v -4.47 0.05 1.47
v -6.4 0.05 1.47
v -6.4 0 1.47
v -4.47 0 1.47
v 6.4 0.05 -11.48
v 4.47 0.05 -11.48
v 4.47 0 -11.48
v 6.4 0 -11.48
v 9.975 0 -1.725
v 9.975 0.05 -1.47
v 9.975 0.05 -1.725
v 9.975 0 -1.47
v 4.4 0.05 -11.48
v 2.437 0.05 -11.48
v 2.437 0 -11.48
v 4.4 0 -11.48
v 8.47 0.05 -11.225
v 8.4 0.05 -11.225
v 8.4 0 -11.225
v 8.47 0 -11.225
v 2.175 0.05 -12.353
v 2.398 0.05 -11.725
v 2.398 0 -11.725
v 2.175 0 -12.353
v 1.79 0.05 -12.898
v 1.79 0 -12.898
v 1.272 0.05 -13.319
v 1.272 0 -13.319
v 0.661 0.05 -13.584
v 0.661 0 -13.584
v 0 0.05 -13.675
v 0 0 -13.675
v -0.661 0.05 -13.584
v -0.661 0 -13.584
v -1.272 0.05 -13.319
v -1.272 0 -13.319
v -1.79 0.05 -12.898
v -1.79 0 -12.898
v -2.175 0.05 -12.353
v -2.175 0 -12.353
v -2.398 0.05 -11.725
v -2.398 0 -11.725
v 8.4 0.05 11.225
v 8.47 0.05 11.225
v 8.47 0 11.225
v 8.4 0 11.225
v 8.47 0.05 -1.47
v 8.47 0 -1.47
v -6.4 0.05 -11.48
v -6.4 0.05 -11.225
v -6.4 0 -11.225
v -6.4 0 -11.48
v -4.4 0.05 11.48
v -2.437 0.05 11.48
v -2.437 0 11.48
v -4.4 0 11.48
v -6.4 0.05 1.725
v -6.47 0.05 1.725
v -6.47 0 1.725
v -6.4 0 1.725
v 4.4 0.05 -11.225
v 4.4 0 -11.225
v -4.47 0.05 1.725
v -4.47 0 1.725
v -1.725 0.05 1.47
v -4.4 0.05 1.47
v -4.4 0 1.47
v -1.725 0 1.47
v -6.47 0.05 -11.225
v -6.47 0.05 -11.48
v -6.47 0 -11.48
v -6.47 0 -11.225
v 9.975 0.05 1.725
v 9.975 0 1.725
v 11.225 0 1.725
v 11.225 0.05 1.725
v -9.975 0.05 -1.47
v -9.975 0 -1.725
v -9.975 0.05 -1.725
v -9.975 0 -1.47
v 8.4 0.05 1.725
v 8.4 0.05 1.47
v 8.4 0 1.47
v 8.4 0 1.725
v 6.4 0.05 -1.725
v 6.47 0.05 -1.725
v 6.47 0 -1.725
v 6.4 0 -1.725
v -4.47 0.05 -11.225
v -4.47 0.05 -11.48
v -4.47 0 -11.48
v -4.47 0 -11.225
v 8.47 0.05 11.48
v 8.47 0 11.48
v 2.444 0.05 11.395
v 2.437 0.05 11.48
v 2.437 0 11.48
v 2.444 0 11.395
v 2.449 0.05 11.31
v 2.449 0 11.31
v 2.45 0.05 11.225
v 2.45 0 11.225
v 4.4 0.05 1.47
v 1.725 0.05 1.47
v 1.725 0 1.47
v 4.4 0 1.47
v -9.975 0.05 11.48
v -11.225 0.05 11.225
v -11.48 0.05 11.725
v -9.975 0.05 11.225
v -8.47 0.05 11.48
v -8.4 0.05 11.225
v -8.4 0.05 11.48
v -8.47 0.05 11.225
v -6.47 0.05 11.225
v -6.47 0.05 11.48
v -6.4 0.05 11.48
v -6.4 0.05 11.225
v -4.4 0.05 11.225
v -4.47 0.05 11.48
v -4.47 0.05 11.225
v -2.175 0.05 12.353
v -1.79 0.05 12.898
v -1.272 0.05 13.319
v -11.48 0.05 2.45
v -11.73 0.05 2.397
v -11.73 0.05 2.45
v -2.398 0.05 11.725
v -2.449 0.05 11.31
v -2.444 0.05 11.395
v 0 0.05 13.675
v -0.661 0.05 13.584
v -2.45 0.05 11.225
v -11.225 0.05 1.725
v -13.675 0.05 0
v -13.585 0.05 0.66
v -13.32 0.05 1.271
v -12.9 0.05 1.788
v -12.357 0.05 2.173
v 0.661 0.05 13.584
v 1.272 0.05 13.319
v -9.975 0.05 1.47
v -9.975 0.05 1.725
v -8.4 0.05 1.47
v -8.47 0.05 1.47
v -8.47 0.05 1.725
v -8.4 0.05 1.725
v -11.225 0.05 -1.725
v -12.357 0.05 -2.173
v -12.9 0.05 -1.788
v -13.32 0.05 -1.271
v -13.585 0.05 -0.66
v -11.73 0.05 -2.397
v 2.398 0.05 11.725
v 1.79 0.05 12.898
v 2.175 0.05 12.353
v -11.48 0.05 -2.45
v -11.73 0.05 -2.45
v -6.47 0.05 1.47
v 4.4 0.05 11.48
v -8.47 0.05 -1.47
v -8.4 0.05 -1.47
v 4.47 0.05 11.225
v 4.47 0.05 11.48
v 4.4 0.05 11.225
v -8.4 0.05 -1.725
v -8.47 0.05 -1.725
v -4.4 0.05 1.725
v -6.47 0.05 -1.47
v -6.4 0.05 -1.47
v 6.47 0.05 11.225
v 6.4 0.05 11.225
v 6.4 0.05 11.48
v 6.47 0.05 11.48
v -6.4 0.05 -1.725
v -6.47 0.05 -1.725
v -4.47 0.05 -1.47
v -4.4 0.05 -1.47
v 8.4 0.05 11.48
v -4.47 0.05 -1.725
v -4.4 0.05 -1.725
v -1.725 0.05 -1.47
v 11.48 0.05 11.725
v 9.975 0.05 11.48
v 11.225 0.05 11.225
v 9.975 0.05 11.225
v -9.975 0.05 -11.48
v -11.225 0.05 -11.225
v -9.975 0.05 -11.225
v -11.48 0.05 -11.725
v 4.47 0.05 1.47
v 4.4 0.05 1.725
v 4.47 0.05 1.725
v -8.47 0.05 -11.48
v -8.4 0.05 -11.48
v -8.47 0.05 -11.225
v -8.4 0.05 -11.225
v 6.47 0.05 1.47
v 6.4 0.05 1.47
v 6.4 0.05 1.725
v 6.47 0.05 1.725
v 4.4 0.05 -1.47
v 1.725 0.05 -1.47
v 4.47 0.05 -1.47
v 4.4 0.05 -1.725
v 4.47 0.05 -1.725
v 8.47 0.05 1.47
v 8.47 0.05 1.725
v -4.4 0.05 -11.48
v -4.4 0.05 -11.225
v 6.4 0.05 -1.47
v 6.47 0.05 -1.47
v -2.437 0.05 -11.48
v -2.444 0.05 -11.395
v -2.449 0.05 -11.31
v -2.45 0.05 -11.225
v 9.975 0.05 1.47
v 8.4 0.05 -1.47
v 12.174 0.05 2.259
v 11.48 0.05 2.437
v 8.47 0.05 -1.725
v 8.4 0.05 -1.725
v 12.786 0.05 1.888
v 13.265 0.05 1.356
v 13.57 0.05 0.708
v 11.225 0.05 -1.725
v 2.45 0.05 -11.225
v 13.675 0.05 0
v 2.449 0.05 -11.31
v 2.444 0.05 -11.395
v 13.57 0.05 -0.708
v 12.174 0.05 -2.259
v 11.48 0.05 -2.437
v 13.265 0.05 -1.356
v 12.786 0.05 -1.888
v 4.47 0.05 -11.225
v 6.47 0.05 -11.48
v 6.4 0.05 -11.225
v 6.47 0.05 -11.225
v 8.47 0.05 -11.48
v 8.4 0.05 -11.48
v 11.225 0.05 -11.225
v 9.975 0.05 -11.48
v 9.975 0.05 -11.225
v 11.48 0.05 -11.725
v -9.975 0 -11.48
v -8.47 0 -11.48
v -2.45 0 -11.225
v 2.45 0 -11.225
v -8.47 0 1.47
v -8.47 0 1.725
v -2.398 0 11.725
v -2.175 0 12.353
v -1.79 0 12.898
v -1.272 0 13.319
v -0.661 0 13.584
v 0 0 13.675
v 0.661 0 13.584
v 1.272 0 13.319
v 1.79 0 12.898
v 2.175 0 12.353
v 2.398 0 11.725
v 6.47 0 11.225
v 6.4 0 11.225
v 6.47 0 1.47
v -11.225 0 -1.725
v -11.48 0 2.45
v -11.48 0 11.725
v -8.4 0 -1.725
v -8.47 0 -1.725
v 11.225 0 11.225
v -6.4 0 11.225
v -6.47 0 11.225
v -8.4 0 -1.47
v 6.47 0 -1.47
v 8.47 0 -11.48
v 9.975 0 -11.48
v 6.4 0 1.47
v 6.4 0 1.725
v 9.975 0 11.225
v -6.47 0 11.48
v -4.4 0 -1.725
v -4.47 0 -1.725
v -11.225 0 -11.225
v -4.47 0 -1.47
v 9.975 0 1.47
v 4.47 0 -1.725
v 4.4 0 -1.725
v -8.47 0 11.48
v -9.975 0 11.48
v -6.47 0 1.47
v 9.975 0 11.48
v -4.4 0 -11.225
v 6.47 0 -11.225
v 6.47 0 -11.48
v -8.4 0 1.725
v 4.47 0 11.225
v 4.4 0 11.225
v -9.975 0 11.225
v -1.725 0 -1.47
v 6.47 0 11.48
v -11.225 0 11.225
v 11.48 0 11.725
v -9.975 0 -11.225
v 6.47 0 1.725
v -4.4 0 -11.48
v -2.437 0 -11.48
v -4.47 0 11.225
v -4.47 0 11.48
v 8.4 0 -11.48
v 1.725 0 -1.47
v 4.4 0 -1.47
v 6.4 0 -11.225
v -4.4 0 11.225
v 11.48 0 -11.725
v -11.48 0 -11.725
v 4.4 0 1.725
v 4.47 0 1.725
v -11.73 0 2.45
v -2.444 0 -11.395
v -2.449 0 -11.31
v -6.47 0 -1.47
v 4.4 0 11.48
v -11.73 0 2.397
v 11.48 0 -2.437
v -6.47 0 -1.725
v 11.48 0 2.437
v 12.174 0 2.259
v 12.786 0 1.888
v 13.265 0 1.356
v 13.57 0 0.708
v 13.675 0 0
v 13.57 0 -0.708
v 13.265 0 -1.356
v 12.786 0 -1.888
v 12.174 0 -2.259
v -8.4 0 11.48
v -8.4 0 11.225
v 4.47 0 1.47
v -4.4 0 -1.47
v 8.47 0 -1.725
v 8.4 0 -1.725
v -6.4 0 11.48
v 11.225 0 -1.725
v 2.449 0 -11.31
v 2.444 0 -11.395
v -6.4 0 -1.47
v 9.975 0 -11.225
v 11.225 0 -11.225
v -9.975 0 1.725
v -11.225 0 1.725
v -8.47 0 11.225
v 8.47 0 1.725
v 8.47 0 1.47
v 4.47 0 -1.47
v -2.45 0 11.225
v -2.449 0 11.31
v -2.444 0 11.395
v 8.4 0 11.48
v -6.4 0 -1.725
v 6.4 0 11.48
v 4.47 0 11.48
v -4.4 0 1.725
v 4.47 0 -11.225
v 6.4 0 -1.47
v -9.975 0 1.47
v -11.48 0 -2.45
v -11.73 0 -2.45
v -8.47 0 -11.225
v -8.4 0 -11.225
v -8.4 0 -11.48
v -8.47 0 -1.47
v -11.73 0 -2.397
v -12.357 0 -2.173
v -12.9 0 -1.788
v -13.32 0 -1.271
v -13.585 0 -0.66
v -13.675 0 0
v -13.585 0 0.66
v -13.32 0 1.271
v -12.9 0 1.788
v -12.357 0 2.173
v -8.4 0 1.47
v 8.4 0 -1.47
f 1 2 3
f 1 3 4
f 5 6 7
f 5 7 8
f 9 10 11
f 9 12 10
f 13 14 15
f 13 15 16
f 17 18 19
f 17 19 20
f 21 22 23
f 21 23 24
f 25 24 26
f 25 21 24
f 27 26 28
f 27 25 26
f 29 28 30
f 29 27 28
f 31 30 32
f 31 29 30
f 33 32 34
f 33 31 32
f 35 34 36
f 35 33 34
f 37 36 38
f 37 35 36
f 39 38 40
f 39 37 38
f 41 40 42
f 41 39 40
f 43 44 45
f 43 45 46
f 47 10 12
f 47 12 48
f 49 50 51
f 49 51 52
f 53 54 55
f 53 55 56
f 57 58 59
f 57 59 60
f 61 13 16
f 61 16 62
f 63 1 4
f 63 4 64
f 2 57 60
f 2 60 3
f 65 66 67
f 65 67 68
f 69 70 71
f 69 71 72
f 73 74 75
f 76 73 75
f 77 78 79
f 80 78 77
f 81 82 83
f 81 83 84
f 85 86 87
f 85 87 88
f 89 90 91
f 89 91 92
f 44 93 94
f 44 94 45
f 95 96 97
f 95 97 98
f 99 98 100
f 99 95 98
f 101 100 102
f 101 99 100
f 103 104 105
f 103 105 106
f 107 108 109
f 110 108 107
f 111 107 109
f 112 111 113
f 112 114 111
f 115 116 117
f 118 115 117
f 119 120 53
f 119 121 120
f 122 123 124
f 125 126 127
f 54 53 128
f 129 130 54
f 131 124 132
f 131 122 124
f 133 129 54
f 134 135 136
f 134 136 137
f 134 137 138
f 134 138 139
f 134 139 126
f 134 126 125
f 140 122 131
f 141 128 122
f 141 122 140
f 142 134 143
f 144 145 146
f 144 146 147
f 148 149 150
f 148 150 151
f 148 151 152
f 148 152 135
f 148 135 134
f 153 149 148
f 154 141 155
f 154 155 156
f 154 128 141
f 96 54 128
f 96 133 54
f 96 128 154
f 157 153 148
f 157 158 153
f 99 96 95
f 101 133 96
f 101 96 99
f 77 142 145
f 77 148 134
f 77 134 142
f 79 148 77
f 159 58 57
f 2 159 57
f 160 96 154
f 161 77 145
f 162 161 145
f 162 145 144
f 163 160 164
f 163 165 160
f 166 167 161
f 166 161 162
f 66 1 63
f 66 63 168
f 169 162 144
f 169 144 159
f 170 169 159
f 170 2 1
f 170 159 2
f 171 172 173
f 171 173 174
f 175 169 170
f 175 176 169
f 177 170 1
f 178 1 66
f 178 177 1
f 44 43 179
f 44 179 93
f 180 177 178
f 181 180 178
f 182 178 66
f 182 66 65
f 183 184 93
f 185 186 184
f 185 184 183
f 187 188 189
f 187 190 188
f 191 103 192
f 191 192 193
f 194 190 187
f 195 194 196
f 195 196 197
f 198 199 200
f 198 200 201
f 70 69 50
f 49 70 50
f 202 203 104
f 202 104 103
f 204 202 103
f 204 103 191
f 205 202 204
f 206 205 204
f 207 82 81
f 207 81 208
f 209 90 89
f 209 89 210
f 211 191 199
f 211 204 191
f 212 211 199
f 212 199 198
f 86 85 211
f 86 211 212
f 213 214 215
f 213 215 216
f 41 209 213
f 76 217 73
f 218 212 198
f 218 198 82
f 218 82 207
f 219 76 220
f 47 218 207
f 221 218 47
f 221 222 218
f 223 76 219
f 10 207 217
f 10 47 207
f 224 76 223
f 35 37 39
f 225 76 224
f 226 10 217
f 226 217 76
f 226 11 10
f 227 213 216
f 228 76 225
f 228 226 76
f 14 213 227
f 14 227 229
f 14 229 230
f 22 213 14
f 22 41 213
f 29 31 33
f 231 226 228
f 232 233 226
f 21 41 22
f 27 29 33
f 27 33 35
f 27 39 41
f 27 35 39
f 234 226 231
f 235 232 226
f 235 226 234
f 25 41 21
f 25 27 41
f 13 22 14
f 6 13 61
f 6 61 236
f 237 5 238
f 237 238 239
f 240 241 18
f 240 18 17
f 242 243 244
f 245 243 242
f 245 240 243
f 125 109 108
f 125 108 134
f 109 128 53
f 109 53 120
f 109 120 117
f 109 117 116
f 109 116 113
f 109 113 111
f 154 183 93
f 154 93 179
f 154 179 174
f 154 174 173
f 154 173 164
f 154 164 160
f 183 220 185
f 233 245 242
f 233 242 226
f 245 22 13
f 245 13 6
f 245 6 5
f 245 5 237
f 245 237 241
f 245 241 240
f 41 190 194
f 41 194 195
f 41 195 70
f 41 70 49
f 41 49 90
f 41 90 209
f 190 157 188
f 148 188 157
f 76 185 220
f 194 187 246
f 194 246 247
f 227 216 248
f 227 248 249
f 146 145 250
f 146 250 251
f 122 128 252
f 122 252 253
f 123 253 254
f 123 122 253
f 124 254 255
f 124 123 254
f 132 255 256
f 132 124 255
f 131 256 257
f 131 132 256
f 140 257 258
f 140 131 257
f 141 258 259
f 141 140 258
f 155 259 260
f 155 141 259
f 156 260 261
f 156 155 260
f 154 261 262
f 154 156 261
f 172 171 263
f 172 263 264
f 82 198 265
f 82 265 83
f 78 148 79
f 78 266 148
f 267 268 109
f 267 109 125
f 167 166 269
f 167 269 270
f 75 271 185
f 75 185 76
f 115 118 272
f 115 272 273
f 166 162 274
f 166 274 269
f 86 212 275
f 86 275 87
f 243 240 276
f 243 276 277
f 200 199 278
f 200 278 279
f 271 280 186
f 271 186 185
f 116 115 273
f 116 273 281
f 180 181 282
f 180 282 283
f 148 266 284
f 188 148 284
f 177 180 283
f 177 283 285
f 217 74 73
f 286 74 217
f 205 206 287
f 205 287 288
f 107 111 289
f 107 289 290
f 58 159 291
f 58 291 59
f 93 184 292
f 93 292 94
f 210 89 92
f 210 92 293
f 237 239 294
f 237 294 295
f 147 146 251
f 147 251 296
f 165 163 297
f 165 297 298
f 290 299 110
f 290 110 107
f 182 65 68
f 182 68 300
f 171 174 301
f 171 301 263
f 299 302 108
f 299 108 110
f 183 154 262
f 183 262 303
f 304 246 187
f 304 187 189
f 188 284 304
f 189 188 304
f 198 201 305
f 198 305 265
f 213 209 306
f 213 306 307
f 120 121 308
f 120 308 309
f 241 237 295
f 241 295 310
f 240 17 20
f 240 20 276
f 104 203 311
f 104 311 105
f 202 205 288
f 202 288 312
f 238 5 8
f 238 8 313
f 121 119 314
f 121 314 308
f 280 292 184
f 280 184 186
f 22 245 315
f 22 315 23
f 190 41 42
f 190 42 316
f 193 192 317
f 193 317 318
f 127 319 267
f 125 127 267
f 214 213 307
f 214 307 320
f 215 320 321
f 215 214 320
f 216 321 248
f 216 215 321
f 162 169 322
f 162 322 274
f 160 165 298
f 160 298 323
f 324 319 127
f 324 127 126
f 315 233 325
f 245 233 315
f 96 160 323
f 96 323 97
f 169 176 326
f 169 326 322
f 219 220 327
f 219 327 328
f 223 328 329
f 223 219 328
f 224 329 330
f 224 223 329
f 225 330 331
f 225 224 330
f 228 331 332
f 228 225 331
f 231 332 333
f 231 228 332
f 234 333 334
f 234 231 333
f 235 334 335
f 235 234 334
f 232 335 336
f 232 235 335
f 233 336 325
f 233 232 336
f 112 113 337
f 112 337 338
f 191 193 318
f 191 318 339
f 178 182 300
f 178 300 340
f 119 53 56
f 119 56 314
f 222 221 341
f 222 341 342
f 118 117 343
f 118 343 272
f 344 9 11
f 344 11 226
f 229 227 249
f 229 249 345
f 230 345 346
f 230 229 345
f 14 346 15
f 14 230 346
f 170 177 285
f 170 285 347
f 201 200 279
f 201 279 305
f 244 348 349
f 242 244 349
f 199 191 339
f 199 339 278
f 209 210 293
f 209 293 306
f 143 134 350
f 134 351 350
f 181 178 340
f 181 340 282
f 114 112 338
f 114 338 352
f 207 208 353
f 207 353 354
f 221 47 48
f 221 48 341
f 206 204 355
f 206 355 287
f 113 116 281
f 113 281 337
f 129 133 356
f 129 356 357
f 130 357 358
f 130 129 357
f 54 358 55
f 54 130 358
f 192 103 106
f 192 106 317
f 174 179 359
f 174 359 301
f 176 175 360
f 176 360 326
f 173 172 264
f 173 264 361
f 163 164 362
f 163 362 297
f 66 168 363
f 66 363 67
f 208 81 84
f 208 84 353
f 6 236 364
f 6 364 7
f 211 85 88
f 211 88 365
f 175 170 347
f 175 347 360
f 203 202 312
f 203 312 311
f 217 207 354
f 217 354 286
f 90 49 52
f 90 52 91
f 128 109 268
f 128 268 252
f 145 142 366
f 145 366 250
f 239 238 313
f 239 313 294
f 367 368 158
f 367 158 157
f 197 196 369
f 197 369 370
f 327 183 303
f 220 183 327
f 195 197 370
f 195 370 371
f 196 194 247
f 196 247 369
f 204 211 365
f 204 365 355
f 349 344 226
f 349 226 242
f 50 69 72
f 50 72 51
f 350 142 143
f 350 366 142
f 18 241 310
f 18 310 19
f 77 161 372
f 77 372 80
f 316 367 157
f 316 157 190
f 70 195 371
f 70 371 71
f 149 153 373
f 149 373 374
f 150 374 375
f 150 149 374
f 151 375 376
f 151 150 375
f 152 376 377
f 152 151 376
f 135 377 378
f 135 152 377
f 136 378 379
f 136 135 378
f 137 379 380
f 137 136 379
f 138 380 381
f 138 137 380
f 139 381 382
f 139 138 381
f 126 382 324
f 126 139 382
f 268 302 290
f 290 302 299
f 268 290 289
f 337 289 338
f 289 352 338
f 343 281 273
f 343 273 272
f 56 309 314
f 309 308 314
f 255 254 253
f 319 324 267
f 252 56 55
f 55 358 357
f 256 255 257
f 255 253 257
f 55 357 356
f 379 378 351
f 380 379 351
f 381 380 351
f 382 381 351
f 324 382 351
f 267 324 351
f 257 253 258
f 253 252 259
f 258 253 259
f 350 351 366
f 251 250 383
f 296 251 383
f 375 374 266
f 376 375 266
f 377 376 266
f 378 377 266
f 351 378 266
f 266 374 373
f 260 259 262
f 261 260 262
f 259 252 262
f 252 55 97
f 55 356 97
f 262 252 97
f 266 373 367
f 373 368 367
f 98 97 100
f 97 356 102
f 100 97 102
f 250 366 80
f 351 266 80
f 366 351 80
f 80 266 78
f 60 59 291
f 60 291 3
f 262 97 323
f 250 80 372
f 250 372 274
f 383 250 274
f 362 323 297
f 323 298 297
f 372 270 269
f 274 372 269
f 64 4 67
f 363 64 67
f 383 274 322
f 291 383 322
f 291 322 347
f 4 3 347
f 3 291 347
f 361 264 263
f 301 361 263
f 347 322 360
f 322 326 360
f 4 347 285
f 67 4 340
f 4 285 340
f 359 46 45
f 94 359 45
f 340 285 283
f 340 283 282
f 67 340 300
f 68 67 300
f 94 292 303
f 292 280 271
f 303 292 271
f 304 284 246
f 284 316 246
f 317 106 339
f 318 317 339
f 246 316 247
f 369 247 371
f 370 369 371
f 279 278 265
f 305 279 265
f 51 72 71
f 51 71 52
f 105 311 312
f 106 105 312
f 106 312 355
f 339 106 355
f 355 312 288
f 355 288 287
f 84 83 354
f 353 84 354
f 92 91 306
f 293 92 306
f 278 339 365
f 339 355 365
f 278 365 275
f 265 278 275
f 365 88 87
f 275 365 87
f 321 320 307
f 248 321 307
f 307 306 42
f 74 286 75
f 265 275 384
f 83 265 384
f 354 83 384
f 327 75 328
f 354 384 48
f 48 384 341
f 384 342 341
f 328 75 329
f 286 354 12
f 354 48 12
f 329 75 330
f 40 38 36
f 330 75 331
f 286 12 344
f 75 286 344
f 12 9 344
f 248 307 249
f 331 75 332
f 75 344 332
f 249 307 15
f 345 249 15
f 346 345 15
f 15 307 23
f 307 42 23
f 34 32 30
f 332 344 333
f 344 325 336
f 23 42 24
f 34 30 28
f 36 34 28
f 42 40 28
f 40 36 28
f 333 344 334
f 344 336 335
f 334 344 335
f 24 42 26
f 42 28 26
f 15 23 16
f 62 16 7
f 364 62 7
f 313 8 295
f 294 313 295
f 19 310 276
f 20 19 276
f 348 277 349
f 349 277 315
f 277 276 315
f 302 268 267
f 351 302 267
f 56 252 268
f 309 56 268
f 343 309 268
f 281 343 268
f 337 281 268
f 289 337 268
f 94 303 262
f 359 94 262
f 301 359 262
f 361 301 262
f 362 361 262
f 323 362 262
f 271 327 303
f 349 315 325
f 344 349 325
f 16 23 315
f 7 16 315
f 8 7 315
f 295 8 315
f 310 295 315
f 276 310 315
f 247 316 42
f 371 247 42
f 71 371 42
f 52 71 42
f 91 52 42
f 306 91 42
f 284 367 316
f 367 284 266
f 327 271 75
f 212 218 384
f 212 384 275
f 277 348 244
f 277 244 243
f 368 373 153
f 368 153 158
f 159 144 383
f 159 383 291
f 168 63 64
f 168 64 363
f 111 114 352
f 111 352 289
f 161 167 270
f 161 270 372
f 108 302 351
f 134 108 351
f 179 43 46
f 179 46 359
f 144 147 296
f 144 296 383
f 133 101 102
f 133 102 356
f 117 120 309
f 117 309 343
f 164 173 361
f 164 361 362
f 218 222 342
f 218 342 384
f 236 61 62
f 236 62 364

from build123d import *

# Parameters (mm, degrees)
SKETCH1_W           = 22.96
SKETCH1_H           = 22.96
SKETCH1_W_2         = 22.45
SKETCH1_H_2         = 22.45
SKETCH1_W_3         = 9.5
SKETCH1_H_3         = 0.255
SKETCH1_W_4         = 3.45
SKETCH1_H_4         = 3.45
SKETCH1_R           = 0.975
SKETCH1_W_5         = 0.25
SKETCH1_H_5         = 1
BOSS_EXTRUDE5_DEPTH = 0.05
SKETCH2_W           = 0.07
SKETCH2_H           = 0.5
CUT_EXTRUDE1_DEPTH  = 10
CUT_EXTRUDE3_START  = -10
SKETCH3_R           = 0.975
SKETCH3_W           = 0.561213406
SKETCH3_H           = 2.94
SKETCH3_W_2         = 2.113786594
SKETCH3_H_2         = 0.255
CUT_EXTRUDE3_DEPTH  = 10
BOSS_EXTRUDE7_DEPTH = 0.05


with BuildPart() as part:
    # Sketch1 → Boss-Extrude5 (new body)
    # profile 1 of 8: a face of its own
    with BuildSketch(Plane(origin=(0, 0, 0), x_dir=(1, 0, 0), z_dir=(0, 1, 0))):
        Rectangle(SKETCH1_W, SKETCH1_H)
        Rectangle(SKETCH1_W_2, SKETCH1_H_2, mode=Mode.SUBTRACT)
    # profile 2 of 8: a face of its own
    with BuildSketch(Plane(origin=(0, 0, 0), x_dir=(1, 0, 0), z_dir=(0, 1, 0))):
        with Locations((-6.475, -1.5975)):
            Rectangle(SKETCH1_W_3, SKETCH1_H_3)
    # profile 3 of 8: a face of its own
    with BuildSketch(Plane(origin=(0, 0, 0), x_dir=(1, 0, 0), z_dir=(0, 1, 0))):
        with Locations((-6.475, 1.5975)):
            Rectangle(SKETCH1_W_3, SKETCH1_H_3)
    # profile 4 of 8: a face of its own
    with BuildSketch(Plane(origin=(0, 0, 0), x_dir=(1, 0, 0), z_dir=(0, 1, 0))):
        Rectangle(SKETCH1_W_4, SKETCH1_H_4)
        with Locations(Location((0, 0, 0), (0, 0, 270))):
            Circle(SKETCH1_R, mode=Mode.SUBTRACT)
    # profile 5 of 8: a face of its own
    with BuildSketch(Plane(origin=(0, 0, 0), x_dir=(1, 0, 0), z_dir=(0, 1, 0))):
        with Locations((6.475, 1.5975)):
            Rectangle(SKETCH1_W_3, SKETCH1_H_3)
    # profile 6 of 8: a face of its own
    with BuildSketch(Plane(origin=(0, 0, 0), x_dir=(1, 0, 0), z_dir=(0, 1, 0))):
        with Locations((6.475, -1.5975)):
            Rectangle(SKETCH1_W_3, SKETCH1_H_3)
    # profile 7 of 8: a face of its own
    with BuildSketch(Plane(origin=(0, 0, 0), x_dir=(1, 0, 0), z_dir=(0, 1, 0))):
        with Locations((-11.605, -1.95)):
            Rectangle(SKETCH1_W_5, SKETCH1_H_5)
    # profile 8 of 8: a face of its own
    with BuildSketch(Plane(origin=(0, 0, 0), x_dir=(1, 0, 0), z_dir=(0, 1, 0))):
        with Locations((-11.605, 1.95)):
            Rectangle(SKETCH1_W_5, SKETCH1_H_5)
    extrude(amount=BOSS_EXTRUDE5_DEPTH)

    # Sketch2 → Cut-Extrude1 (cut)
    with BuildSketch(Plane(origin=(0, 0.05, 0), x_dir=(1, 0, 0), z_dir=(0, 1, 0))):
        with Locations((-6.435, 1.475)):
            Rectangle(SKETCH2_W, SKETCH2_H)
        with Locations((-8.435, 1.475)):
            Rectangle(SKETCH2_W, SKETCH2_H)
        with Locations((-4.435, 1.475)):
            Rectangle(SKETCH2_W, SKETCH2_H)
        with Locations((-4.435, 11.475)):
            Rectangle(SKETCH2_W, SKETCH2_H)
        with Locations((-6.435, 11.475)):
            Rectangle(SKETCH2_W, SKETCH2_H)
        with Locations((-8.435, 11.475)):
            Rectangle(SKETCH2_W, SKETCH2_H)
        with Locations((4.435, 1.475)):
            Rectangle(SKETCH2_W, SKETCH2_H)
        with Locations((6.435, 1.475)):
            Rectangle(SKETCH2_W, SKETCH2_H)
        with Locations((8.435, 1.475)):
            Rectangle(SKETCH2_W, SKETCH2_H)
        with Locations((4.435, 11.475)):
            Rectangle(SKETCH2_W, SKETCH2_H)
        with Locations((6.435, 11.475)):
            Rectangle(SKETCH2_W, SKETCH2_H)
        with Locations((8.435, 11.475)):
            Rectangle(SKETCH2_W, SKETCH2_H)
        with Locations((-8.435, -11.475)):
            Rectangle(SKETCH2_W, SKETCH2_H)
        with Locations((-6.435, -11.475)):
            Rectangle(SKETCH2_W, SKETCH2_H)
        with Locations((-4.435, -11.475)):
            Rectangle(SKETCH2_W, SKETCH2_H)
        with Locations((4.435, -11.475)):
            Rectangle(SKETCH2_W, SKETCH2_H)
        with Locations((6.435, -11.475)):
            Rectangle(SKETCH2_W, SKETCH2_H)
        with Locations((8.435, -11.475)):
            Rectangle(SKETCH2_W, SKETCH2_H)
        with Locations((8.435, -1.475)):
            Rectangle(SKETCH2_W, SKETCH2_H)
        with Locations((6.435, -1.475)):
            Rectangle(SKETCH2_W, SKETCH2_H)
        with Locations((4.435, -1.475)):
            Rectangle(SKETCH2_W, SKETCH2_H)
        with Locations((-4.435, -1.475)):
            Rectangle(SKETCH2_W, SKETCH2_H)
        with Locations((-6.435, -1.475)):
            Rectangle(SKETCH2_W, SKETCH2_H)
        with Locations((-8.435, -1.475)):
            Rectangle(SKETCH2_W, SKETCH2_H)
    extrude(amount=-CUT_EXTRUDE1_DEPTH, mode=Mode.SUBTRACT)

    # Sketch3 → Cut-Extrude3 (cut)
    # profile 1 of 9: a face of its own
    with BuildSketch(Plane(origin=(0, 0.05, 0), x_dir=(1, 0, 0), z_dir=(0, 1, 0)).offset(CUT_EXTRUDE3_START)):
        Polygon((-9.975, 11.48), (-9.975, -11.48), (-2.286213406, -11.48), (-2.286213406, -1.725), (-4.4, -1.725), (-4.4, -1.47), (-2.286213406, -1.47), (-2.286213406, 1.47), (-4.4, 1.47), (-4.4, 1.725), (-2.286213406, 1.725), (-2.286213406, 11.48), align=None)
    # profile 2 of 9: a face of its own
    with BuildSketch(Plane(origin=(0, 0.05, 0), x_dir=(1, 0, 0), z_dir=(0, 1, 0)).offset(CUT_EXTRUDE3_START)):
        Polygon((-2.286213406, -1.47), (-2.286213406, -1.725), (0, -1.725), (2.286213406, -1.725), (2.286213406, -1.47), (1.725, -1.47), (1.725, 1.47), (2.286213406, 1.47), (2.286213406, 1.725), (0, 1.725), (-2.286213406, 1.725), (-2.286213406, 1.47), (-1.725, 1.47), (-1.725, -1.47), align=None)
        Circle(SKETCH3_R, mode=Mode.SUBTRACT)
    # profile 3 of 9: a face of its own
    with BuildSketch(Plane(origin=(0, 0.05, 0), x_dir=(1, 0, 0), z_dir=(0, 1, 0)).offset(CUT_EXTRUDE3_START)):
        Polygon((2.286213406, -1.725), (2.286213406, -11.48), (9.975, -11.48), (9.975, 11.48), (2.286213406, 11.48), (2.286213406, 1.725), (4.4, 1.725), (4.4, 1.47), (2.286213406, 1.47), (2.286213406, -1.47), (4.4, -1.47), (4.4, -1.725), align=None)
    # profile 4 of 9: a face of its own
    with BuildSketch(Plane(origin=(0, 0.05, 0), x_dir=(1, 0, 0), z_dir=(0, 1, 0)).offset(CUT_EXTRUDE3_START)):
        with Locations((2.005606703, 0)):
            Rectangle(SKETCH3_W, SKETCH3_H)
    # profile 5 of 9: a face of its own
    with BuildSketch(Plane(origin=(0, 0.05, 0), x_dir=(1, 0, 0), z_dir=(0, 1, 0)).offset(CUT_EXTRUDE3_START)):
        with Locations((-2.005606703, 0)):
            Rectangle(SKETCH3_W, SKETCH3_H)
    # profile 6 of 9: a face of its own
    with BuildSketch(Plane(origin=(0, 0.05, 0), x_dir=(1, 0, 0), z_dir=(0, 1, 0)).offset(CUT_EXTRUDE3_START)):
        with Locations((-3.343106703, 1.5975)):
            Rectangle(SKETCH3_W_2, SKETCH3_H_2)
    # profile 7 of 9: a face of its own
    with BuildSketch(Plane(origin=(0, 0.05, 0), x_dir=(1, 0, 0), z_dir=(0, 1, 0)).offset(CUT_EXTRUDE3_START)):
        with Locations((-3.343106703, -1.5975)):
            Rectangle(SKETCH3_W_2, SKETCH3_H_2)
    # profile 8 of 9: a face of its own
    with BuildSketch(Plane(origin=(0, 0.05, 0), x_dir=(1, 0, 0), z_dir=(0, 1, 0)).offset(CUT_EXTRUDE3_START)):
        with Locations((3.343106703, 1.5975)):
            Rectangle(SKETCH3_W_2, SKETCH3_H_2)
    # profile 9 of 9: a face of its own
    with BuildSketch(Plane(origin=(0, 0.05, 0), x_dir=(1, 0, 0), z_dir=(0, 1, 0)).offset(CUT_EXTRUDE3_START)):
        with Locations((3.343106703, -1.5975)):
            Rectangle(SKETCH3_W_2, SKETCH3_H_2)
    extrude(amount=CUT_EXTRUDE3_DEPTH, mode=Mode.SUBTRACT)

    # Sketch5 → Boss-Extrude7 (add)
    with BuildSketch(Plane(origin=(0, 0.05, 0), x_dir=(1, 0, 0), z_dir=(0, 1, 0))):
        with BuildLine():
            Line((-11.225, 1.47), (-11.225, 2.45))
            ThreePointArc((-11.225, 2.45), (-13.675, 0), (-11.225, -2.45))
            Line((-11.225, -2.45), (-11.225, -1.47))
            Line((-11.225, -1.47), (-8.47, -1.47))
            Line((-8.47, -1.47), (-8.47, -1.725))
            Line((-8.47, -1.725), (-8.4, -1.725))
            Line((-8.4, -1.725), (-8.4, -1.47))
            Line((-8.4, -1.47), (-6.47, -1.47))
            Line((-6.47, -1.47), (-6.47, -1.725))
            Line((-6.47, -1.725), (-6.4, -1.725))
            Line((-6.4, -1.725), (-6.4, -1.47))
            Line((-6.4, -1.47), (-4.47, -1.47))
            Line((-4.47, -1.47), (-4.47, -1.725))
            Line((-4.47, -1.725), (-4.4, -1.725))
            Line((-4.4, -1.725), (-4.4, -1.47))
            Line((-4.4, -1.47), (-1.725, -1.47))
            Line((-1.725, -1.47), (-1.725, 1.47))
            Line((-1.725, 1.47), (-4.4, 1.47))
            Line((-4.4, 1.47), (-4.4, 1.725))
            Line((-4.4, 1.725), (-4.47, 1.725))
            Line((-4.47, 1.725), (-4.47, 1.47))
            Line((-4.47, 1.47), (-6.4, 1.47))
            Line((-6.4, 1.47), (-6.4, 1.725))
            Line((-6.4, 1.725), (-6.47, 1.725))
            Line((-6.47, 1.725), (-6.47, 1.47))
            Line((-6.47, 1.47), (-8.4, 1.47))
            Line((-8.4, 1.47), (-8.4, 1.725))
            Line((-8.4, 1.725), (-8.47, 1.725))
            Line((-8.47, 1.725), (-8.47, 1.47))
            Line((-8.47, 1.47), (-11.225, 1.47))
        make_face()
        with BuildLine():
            Line((-2.45, 11.225), (2.45, 11.225))
            ThreePointArc((2.45, 11.225), (2.446671103, 11.352673474), (2.436693456, 11.48))
            Line((2.436693456, 11.48), (4.4, 11.48))
            Line((4.4, 11.48), (4.4, 11.225))
            Line((4.4, 11.225), (4.47, 11.225))
            Line((4.47, 11.225), (4.47, 11.48))
            Line((4.47, 11.48), (6.4, 11.48))
            Line((6.4, 11.48), (6.4, 11.225))
            Line((6.4, 11.225), (6.47, 11.225))
            Line((6.47, 11.225), (6.47, 11.48))
            Line((6.47, 11.48), (8.4, 11.48))
            Line((8.4, 11.48), (8.4, 11.225))
            Line((8.4, 11.225), (8.47, 11.225))
            Line((8.47, 11.225), (8.47, 11.48))
            Line((8.47, 11.48), (11.48, 11.48))
            Line((11.48, 11.48), (11.48, 11.724852246))
            Line((11.48, 11.724852246), (2.398467788, 11.724852246))
            ThreePointArc((2.398467788, 11.724852246), (0, 13.675), (-2.398467788, 11.724852246))
            Line((-2.398467788, 11.724852246), (-11.48, 11.724852246))
            Line((-11.48, 11.724852246), (-11.48, 11.48))
            Line((-11.48, 11.48), (-8.47, 11.48))
            Line((-8.47, 11.48), (-8.47, 11.225))
            Line((-8.47, 11.225), (-8.4, 11.225))
            Line((-8.4, 11.225), (-8.4, 11.48))
            Line((-8.4, 11.48), (-6.47, 11.48))
            Line((-6.47, 11.48), (-6.47, 11.225))
            Line((-6.47, 11.225), (-6.4, 11.225))
            Line((-6.4, 11.225), (-6.4, 11.48))
            Line((-6.4, 11.48), (-4.47, 11.48))
            Line((-4.47, 11.48), (-4.47, 11.225))
            Line((-4.47, 11.225), (-4.4, 11.225))
            Line((-4.4, 11.225), (-4.4, 11.48))
            Line((-4.4, 11.48), (-2.436693456, 11.48))
            ThreePointArc((-2.436693456, 11.48), (-2.446671103, 11.352673474), (-2.45, 11.225))
        make_face()
        with BuildLine():
            Line((11.225, 2.45), (11.225, 1.47))
            Line((11.225, 1.47), (8.47, 1.47))
            Line((8.47, 1.47), (8.47, 1.725))
            Line((8.47, 1.725), (8.4, 1.725))
            Line((8.4, 1.725), (8.4, 1.47))
            Line((8.4, 1.47), (6.47, 1.47))
            Line((6.47, 1.47), (6.47, 1.725))
            Line((6.47, 1.725), (6.4, 1.725))
            Line((6.4, 1.725), (6.4, 1.47))
            Line((6.4, 1.47), (4.47, 1.47))
            Line((4.47, 1.47), (4.47, 1.725))
            Line((4.47, 1.725), (4.4, 1.725))
            Line((4.4, 1.725), (4.4, 1.47))
            Line((4.4, 1.47), (1.725, 1.47))
            Line((1.725, 1.47), (1.725, -1.47))
            Line((1.725, -1.47), (4.4, -1.47))
            Line((4.4, -1.47), (4.4, -1.725))
            Line((4.4, -1.725), (4.47, -1.725))
            Line((4.47, -1.725), (4.47, -1.47))
            Line((4.47, -1.47), (6.4, -1.47))
            Line((6.4, -1.47), (6.4, -1.725))
            Line((6.4, -1.725), (6.47, -1.725))
            Line((6.47, -1.725), (6.47, -1.47))
            Line((6.47, -1.47), (8.4, -1.47))
            Line((8.4, -1.47), (8.4, -1.725))
            Line((8.4, -1.725), (8.47, -1.725))
            Line((8.47, -1.725), (8.47, -1.47))
            Line((8.47, -1.47), (11.225, -1.47))
            Line((11.225, -1.47), (11.225, -2.45))
            ThreePointArc((11.225, -2.45), (13.675, 0), (11.225, 2.45))
        make_face()
        with BuildLine():
            Line((2.45, -11.225), (-2.45, -11.225))
            ThreePointArc((-2.45, -11.225), (-2.446671103, -11.352673474), (-2.436693456, -11.48))
            Line((-2.436693456, -11.48), (-4.4, -11.48))
            Line((-4.4, -11.48), (-4.4, -11.225))
            Line((-4.4, -11.225), (-4.47, -11.225))
            Line((-4.47, -11.225), (-4.47, -11.48))
            Line((-4.47, -11.48), (-6.4, -11.48))
            Line((-6.4, -11.48), (-6.4, -11.225))
            Line((-6.4, -11.225), (-6.47, -11.225))
            Line((-6.47, -11.225), (-6.47, -11.48))
            Line((-6.47, -11.48), (-8.4, -11.48))
            Line((-8.4, -11.48), (-8.4, -11.225))
            Line((-8.4, -11.225), (-8.47, -11.225))
            Line((-8.47, -11.225), (-8.47, -11.48))
            Line((-8.47, -11.48), (-11.48, -11.48))
            Line((-11.48, -11.48), (-11.48, -11.724852246))
            Line((-11.48, -11.724852246), (-2.398467788, -11.724852246))
            ThreePointArc((-2.398467788, -11.724852246), (0, -13.675), (2.398467788, -11.724852246))
            Line((2.398467788, -11.724852246), (11.48, -11.724852246))
            Line((11.48, -11.724852246), (11.48, -11.48))
            Line((11.48, -11.48), (8.47, -11.48))
            Line((8.47, -11.48), (8.47, -11.225))
            Line((8.47, -11.225), (8.4, -11.225))
            Line((8.4, -11.225), (8.4, -11.48))
            Line((8.4, -11.48), (6.47, -11.48))
            Line((6.47, -11.48), (6.47, -11.225))
            Line((6.47, -11.225), (6.4, -11.225))
            Line((6.4, -11.225), (6.4, -11.48))
            Line((6.4, -11.48), (4.47, -11.48))
            Line((4.47, -11.48), (4.47, -11.225))
            Line((4.47, -11.225), (4.4, -11.225))
            Line((4.4, -11.225), (4.4, -11.48))
            Line((4.4, -11.48), (2.436693456, -11.48))
            ThreePointArc((2.436693456, -11.48), (2.446671103, -11.352673474), (2.45, -11.225))
        make_face()
    extrude(amount=-BOSS_EXTRUDE7_DEPTH)


solid = part.part
